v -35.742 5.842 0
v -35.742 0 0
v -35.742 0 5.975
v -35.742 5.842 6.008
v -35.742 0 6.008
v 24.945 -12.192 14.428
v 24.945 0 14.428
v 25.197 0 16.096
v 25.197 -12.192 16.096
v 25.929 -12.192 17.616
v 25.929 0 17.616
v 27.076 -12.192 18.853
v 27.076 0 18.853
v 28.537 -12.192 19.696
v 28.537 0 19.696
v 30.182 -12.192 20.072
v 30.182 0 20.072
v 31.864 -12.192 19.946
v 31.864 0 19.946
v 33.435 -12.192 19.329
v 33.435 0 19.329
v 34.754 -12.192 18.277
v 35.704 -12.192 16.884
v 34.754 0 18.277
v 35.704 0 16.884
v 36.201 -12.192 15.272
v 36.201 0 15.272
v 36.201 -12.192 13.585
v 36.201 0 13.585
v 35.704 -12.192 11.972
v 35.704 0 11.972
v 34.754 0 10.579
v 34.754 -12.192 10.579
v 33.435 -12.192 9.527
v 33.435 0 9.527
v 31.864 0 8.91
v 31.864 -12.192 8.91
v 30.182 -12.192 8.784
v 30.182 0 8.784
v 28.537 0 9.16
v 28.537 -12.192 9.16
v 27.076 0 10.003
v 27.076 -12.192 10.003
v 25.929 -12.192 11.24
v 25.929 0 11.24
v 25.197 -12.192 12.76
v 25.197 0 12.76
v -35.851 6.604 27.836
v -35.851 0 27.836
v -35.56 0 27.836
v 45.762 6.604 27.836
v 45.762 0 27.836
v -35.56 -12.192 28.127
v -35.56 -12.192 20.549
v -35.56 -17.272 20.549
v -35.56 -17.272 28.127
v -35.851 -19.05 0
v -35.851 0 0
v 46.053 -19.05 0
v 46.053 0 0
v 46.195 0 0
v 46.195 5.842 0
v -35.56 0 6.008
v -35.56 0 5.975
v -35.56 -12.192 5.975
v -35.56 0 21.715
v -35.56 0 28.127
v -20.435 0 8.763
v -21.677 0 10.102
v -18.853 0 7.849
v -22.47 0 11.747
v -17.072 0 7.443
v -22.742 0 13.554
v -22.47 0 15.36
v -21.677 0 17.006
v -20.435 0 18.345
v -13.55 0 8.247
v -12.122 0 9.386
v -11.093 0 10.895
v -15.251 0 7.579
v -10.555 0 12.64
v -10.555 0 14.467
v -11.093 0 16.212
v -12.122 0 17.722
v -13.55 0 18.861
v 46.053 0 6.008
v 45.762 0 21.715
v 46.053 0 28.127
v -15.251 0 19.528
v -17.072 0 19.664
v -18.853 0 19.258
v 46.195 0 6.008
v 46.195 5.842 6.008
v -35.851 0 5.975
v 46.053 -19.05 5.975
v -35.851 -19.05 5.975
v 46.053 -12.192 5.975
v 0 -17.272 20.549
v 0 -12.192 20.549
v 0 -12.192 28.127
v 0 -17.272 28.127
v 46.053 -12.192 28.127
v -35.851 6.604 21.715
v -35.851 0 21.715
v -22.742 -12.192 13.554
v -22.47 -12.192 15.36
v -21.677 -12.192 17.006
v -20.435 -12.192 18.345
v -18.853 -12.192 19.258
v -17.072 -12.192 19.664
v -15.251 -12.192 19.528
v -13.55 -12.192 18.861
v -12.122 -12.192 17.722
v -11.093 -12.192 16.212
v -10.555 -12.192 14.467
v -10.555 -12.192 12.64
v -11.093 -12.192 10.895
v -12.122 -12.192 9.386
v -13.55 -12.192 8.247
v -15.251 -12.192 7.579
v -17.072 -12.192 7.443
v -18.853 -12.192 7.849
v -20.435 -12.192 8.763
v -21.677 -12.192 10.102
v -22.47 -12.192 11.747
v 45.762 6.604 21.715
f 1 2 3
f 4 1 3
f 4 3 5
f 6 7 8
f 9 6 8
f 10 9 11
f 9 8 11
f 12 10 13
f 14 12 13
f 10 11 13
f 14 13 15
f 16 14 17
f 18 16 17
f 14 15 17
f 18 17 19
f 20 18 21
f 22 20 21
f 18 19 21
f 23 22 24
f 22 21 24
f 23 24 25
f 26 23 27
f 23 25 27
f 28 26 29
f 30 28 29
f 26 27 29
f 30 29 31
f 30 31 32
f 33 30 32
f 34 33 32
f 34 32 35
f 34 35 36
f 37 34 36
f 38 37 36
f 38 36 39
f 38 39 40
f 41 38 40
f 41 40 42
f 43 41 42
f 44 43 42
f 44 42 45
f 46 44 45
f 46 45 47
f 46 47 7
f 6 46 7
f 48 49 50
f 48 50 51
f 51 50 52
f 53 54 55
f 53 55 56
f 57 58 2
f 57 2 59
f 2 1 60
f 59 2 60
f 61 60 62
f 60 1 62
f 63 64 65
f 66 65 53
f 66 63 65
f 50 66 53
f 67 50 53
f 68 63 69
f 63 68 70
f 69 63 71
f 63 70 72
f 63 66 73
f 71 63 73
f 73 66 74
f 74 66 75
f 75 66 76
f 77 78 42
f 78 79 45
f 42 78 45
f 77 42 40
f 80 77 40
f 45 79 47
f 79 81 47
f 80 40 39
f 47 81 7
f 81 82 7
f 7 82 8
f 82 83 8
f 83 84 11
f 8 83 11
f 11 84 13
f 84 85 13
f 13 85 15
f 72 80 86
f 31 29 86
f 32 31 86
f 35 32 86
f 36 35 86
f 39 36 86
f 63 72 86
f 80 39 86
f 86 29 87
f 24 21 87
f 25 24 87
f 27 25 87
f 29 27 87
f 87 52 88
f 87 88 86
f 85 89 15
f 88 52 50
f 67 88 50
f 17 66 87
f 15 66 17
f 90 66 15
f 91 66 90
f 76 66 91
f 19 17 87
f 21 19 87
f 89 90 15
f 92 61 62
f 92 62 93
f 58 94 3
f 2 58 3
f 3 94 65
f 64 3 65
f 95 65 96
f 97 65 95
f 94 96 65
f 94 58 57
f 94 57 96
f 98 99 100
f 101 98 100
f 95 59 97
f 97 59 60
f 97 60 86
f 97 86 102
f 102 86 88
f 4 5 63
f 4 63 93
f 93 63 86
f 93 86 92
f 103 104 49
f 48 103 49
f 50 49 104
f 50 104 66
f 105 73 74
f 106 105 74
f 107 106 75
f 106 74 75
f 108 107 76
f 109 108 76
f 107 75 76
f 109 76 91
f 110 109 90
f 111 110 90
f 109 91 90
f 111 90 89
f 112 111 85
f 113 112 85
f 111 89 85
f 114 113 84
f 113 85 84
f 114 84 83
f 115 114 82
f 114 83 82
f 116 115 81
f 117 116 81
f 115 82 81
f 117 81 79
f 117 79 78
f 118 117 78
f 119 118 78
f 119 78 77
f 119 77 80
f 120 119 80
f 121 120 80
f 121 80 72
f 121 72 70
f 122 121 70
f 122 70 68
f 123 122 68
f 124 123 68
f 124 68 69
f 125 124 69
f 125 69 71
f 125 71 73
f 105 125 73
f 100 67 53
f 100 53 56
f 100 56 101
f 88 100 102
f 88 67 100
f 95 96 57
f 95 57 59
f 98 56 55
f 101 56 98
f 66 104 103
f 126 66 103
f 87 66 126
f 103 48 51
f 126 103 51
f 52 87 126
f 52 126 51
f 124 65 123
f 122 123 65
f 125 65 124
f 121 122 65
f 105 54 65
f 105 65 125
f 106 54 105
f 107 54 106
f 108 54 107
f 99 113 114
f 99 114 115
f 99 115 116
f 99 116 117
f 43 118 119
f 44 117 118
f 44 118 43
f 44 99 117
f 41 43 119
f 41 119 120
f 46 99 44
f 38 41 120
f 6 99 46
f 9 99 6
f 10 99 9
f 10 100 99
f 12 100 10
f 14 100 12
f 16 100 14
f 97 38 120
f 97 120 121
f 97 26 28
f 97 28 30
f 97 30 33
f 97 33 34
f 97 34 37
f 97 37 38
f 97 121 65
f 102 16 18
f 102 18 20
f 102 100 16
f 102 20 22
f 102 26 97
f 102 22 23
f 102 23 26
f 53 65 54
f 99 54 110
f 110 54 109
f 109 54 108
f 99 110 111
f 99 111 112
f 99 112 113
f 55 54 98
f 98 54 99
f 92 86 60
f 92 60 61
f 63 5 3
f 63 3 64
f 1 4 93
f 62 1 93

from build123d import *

# Parameters (mm, degrees)
F0_W      = 81.613116
F0_H      = 28.127378
F1_DEPTH  = 12.192
F2_W      = 81.937075
F2_H      = 6.007762
F3_DEPTH  = 5.842
F4_W      = 81.90459
F4_H      = 5.975246
F5_DEPTH  = 19.05
F6_W      = 81.61312
F6_H      = 6.120986
F7_DEPTH  = 6.604
F8_R      = 5.659431
F8_R_2    = 6.127921
F9_DEPTH  = 70.104
F10_W     = 35.560001
F10_H     = 7.578362
F11_DEPTH = 5.08


with BuildPart() as f1:
    # F0 (on Front) → F1 (new body)
    with BuildSketch(Plane.XZ):
        with Locations((5.246557, 14.063689)):
            Rectangle(F0_W, F0_H)
    extrude(amount=F1_DEPTH)

    # F2 (on Front) → F3 (join)
    with BuildSketch(Plane.XZ):
        with Locations((5.226239, 3.003881)):
            Rectangle(F2_W, F2_H)
    extrude(amount=-F3_DEPTH)

    # F4 (on Front) → F5 (join)
    with BuildSketch(Plane.XZ):
        with Locations((5.10082, 2.987623)):
            Rectangle(F4_W, F4_H)
    extrude(amount=F5_DEPTH)

    # F6 (on Front) → F7 (join)
    with BuildSketch(Plane.XZ):
        with Locations((4.955081, 24.775409)):
            Rectangle(F6_W, F6_H)
    extrude(amount=-F7_DEPTH)

    # F8 (on face) → F9 (cut)
    with BuildSketch(Plane(origin=(0, 0, 0), x_dir=(-1, 0, 0), z_dir=(0, 1, 0))):
        with Locations((-30.604918, 14.428033)):
            Circle(F8_R)
        with Locations((16.6141, 13.553606)):
            Circle(F8_R_2)
    extrude(amount=-F9_DEPTH, mode=Mode.SUBTRACT)

    # F10 (on face) → F11 (join)
    with BuildSketch(Plane.XZ.offset(12.192)):
        with Locations((-17.78, 24.338197)):
            Rectangle(F10_W, F10_H)
    extrude(amount=F11_DEPTH)


solid = f1.part
